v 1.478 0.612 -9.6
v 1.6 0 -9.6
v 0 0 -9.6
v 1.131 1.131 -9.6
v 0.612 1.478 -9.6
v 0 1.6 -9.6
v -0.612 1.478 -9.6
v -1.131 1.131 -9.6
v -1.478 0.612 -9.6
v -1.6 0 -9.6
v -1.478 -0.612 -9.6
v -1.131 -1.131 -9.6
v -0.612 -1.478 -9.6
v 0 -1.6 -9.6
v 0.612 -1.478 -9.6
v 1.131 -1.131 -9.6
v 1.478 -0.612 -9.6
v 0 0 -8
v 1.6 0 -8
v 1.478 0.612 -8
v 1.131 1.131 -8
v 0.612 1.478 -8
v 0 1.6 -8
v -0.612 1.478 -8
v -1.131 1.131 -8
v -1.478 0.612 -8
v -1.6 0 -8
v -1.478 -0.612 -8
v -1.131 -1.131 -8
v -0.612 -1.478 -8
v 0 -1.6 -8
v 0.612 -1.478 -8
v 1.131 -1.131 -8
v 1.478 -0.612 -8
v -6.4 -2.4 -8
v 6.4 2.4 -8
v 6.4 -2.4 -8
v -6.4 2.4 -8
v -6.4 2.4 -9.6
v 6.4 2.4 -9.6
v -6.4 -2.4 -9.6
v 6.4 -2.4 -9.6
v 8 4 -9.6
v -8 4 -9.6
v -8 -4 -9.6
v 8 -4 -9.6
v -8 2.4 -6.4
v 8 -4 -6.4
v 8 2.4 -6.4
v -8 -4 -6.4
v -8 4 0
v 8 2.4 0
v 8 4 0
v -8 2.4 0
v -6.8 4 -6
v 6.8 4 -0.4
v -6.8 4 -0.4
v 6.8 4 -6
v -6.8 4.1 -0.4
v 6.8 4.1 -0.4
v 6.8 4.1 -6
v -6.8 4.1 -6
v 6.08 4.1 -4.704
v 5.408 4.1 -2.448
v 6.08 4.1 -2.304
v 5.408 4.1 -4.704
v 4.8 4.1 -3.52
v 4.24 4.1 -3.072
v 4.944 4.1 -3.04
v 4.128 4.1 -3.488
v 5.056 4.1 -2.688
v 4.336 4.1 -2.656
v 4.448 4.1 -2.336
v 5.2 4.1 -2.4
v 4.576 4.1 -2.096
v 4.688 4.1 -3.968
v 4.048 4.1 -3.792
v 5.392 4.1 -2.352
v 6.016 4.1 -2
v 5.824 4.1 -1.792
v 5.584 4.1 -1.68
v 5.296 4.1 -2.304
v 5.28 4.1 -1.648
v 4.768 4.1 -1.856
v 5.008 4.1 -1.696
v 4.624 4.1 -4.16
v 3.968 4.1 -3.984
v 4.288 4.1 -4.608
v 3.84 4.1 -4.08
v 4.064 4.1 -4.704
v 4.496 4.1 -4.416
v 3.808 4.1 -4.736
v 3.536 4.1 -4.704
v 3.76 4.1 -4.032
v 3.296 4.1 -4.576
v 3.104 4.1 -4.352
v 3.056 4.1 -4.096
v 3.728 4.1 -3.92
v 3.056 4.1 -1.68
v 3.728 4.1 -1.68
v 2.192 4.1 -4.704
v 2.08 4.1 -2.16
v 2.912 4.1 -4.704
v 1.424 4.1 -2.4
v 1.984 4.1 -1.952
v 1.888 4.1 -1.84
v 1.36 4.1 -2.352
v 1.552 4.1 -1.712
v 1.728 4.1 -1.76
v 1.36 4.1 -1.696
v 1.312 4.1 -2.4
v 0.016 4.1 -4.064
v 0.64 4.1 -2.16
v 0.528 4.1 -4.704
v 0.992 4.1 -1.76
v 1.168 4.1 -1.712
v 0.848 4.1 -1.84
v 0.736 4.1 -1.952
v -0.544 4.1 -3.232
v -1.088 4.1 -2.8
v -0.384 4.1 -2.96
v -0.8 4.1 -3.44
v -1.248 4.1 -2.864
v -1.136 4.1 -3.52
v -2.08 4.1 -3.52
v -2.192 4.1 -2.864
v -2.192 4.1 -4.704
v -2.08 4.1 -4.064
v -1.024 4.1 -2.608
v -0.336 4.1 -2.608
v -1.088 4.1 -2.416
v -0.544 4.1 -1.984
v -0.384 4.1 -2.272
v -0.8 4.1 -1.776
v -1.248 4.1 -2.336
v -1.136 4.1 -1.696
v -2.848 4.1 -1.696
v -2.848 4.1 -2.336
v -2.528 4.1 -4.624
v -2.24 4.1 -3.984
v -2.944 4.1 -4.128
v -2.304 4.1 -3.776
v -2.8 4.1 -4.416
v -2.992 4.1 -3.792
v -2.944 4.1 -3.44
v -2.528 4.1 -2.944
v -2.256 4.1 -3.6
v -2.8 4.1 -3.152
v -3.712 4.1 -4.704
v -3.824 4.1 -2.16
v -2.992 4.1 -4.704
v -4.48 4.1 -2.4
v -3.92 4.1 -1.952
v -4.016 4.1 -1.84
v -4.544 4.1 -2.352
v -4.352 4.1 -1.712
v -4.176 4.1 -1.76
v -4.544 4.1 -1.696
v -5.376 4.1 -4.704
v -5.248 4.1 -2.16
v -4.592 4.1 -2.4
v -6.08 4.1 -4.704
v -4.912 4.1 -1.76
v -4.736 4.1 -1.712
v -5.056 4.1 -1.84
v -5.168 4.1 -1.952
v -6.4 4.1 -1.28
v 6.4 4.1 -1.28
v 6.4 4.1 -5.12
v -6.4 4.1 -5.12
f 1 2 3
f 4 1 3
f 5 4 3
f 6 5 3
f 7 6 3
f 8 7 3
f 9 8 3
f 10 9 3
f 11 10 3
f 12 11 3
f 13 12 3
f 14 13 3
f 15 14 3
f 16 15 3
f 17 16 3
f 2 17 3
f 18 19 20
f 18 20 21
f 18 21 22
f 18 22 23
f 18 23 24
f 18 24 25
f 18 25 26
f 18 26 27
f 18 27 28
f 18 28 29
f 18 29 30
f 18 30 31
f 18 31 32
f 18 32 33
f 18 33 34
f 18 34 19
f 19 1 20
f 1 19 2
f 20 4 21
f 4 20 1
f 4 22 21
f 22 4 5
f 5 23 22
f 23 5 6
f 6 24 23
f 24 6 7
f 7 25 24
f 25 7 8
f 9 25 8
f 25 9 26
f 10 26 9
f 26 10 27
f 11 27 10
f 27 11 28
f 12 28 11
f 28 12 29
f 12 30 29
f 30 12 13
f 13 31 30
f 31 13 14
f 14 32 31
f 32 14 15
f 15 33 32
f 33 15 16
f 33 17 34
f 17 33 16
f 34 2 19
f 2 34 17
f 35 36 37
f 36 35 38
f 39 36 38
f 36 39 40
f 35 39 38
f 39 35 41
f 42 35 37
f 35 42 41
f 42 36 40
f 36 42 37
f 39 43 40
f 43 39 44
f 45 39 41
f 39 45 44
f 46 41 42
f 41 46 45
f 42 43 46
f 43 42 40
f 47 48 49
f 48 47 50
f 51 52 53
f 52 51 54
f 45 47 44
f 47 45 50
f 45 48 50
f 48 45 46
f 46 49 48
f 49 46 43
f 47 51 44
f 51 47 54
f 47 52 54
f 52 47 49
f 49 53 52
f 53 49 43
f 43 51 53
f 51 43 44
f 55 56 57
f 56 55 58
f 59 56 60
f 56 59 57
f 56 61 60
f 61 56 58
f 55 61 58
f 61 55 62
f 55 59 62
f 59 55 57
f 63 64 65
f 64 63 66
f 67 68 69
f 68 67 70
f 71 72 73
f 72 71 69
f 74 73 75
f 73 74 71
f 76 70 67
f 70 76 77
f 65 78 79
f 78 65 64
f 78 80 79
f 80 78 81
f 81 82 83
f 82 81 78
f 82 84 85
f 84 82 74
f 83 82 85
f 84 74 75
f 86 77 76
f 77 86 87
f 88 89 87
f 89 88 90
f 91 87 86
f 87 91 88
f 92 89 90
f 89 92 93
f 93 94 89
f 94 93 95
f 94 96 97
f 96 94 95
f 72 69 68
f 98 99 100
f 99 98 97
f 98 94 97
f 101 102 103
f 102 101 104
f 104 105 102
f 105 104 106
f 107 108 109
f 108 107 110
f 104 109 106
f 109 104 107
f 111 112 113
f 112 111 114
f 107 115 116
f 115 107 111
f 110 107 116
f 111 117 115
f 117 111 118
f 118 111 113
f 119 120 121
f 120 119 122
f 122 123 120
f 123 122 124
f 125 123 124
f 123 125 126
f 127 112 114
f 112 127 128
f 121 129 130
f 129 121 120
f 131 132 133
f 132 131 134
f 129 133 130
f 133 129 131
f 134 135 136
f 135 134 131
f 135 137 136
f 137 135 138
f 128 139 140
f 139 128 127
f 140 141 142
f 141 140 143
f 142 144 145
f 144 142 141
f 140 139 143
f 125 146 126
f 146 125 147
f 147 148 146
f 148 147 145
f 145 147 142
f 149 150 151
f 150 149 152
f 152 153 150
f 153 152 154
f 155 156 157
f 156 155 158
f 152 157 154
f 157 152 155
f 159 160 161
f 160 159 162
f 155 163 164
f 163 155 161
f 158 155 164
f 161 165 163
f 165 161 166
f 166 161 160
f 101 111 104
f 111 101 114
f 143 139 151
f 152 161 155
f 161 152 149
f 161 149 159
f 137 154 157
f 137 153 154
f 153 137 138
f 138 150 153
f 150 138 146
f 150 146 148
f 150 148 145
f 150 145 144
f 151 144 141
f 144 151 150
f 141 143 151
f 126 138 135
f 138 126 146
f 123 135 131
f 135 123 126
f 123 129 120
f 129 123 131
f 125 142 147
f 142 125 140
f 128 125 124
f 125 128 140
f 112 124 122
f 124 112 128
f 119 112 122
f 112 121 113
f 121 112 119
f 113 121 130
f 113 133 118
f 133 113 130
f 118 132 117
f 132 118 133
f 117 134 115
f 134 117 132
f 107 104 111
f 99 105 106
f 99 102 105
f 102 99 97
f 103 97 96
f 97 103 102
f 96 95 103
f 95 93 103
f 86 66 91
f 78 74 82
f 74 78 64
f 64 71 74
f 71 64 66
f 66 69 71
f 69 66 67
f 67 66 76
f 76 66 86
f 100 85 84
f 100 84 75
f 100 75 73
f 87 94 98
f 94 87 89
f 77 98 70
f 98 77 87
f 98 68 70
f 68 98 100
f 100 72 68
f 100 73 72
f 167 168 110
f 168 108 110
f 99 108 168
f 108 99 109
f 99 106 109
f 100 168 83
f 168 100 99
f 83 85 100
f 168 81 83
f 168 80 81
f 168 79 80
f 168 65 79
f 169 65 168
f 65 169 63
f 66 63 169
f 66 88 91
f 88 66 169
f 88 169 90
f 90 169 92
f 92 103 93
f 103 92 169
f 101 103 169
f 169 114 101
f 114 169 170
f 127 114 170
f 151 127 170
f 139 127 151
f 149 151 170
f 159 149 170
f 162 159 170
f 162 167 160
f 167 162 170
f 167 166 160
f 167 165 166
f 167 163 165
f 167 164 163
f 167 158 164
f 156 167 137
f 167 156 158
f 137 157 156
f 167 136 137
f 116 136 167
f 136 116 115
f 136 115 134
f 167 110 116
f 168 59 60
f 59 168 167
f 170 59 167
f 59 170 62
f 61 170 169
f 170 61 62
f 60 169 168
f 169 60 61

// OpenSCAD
// file: ../p/4-4edge.scad
use <../lib.scad>
function ldraw_lib__4_4edge() = [
// 0 Circle 1.0
// 0 Name: 4-4edge.dat
// 0 Author: James Jessiman
// 0 !LDRAW_ORG Primitive UPDATE 2017-01
// 0 !LICENSE Licensed under CC BY 2.0 and CC BY 4.0 : see CAreadme.txt
// 
// 0 BFC CERTIFY CCW
  [0,"BFC","CERTIFY"],
  [0,"BFC","CCW"],
// 
// 0 !HISTORY 1998-12-15 [PTadmin] Official Update 1998-10
// 0 !HISTORY 2005-12-28 [PTadmin] Official Update 2005-01
// 0 !HISTORY 2007-06-24 [PTadmin] Header formatted for Contributor Agreement
// 0 !HISTORY 2008-07-01 [PTadmin] Official Update 2008-01
// 0 !HISTORY 2017-01-15 [Steffen] BFCed
// 0 !HISTORY 2017-12-30 [PTadmin] Official Update 2017-01
// 
// 
// 2 24 1 0 0 0.9239 0 0.3827
  [2,24,1,0,0,0.9239,0,0.3827],
// 2 24 0.9239 0 0.3827 0.7071 0 0.7071
  [2,24,0.9239,0,0.3827,0.7071,0,0.7071],
// 2 24 0.7071 0 0.7071 0.3827 0 0.9239
  [2,24,0.7071,0,0.7071,0.3827,0,0.9239],
// 2 24 0.3827 0 0.9239 0 0 1
  [2,24,0.3827,0,0.9239,0,0,1],
// 2 24 0 0 1 -0.3827 0 0.9239
  [2,24,0,0,1,-0.3827,0,0.9239],
// 2 24 -0.3827 0 0.9239 -0.7071 0 0.7071
  [2,24,-0.3827,0,0.9239,-0.7071,0,0.7071],
// 2 24 -0.7071 0 0.7071 -0.9239 0 0.3827
  [2,24,-0.7071,0,0.7071,-0.9239,0,0.3827],
// 2 24 -0.9239 0 0.3827 -1 0 -0
  [2,24,-0.9239,0,0.3827,-1,0,-0],
// 2 24 -1 0 -0 -0.9239 0 -0.3827
  [2,24,-1,0,-0,-0.9239,0,-0.3827],
// 2 24 -0.9239 0 -0.3827 -0.7071 0 -0.7071
  [2,24,-0.9239,0,-0.3827,-0.7071,0,-0.7071],
// 2 24 -0.7071 0 -0.7071 -0.3827 0 -0.9239
  [2,24,-0.7071,0,-0.7071,-0.3827,0,-0.9239],
// 2 24 -0.3827 0 -0.9239 0 0 -1
  [2,24,-0.3827,0,-0.9239,0,0,-1],
// 2 24 0 0 -1 0.3827 0 -0.9239
  [2,24,0,0,-1,0.3827,0,-0.9239],
// 2 24 0.3827 0 -0.9239 0.7071 0 -0.7071
  [2,24,0.3827,0,-0.9239,0.7071,0,-0.7071],
// 2 24 0.7071 0 -0.7071 0.9239 0 -0.3827
  [2,24,0.7071,0,-0.7071,0.9239,0,-0.3827],
// 2 24 0.9239 0 -0.3827 1 0 0
  [2,24,0.9239,0,-0.3827,1,0,0],
];
module ldraw_lib__4_4edge(step=0, col=false, unit=2/5, alt=false, line=0.2, solid=!$preview)
    makepoly(ldraw_lib__4_4edge(), step=step, col=col, unit=unit, alt=alt, line=line, solid=solid);
ldraw_lib__4_4edge(line=0.2);
// file: ../p/4-4disc.scad
use <../lib.scad>
function ldraw_lib__4_4disc() = [
// 0 Disc 1.0
// 0 Name: 4-4disc.dat
// 0 Author: James Jessiman
// 0 !LDRAW_ORG Primitive UPDATE 2002-02
// 0 !LICENSE Licensed under CC BY 2.0 and CC BY 4.0 : see CAreadme.txt
// 
// 0 BFC CERTIFY CCW
  [0,"BFC","CERTIFY"],
  [0,"BFC","CCW"],
// 
// 0 !HISTORY 1998-12-15 [PTadmin] Official Update 1998-10
// 0 !HISTORY 2002-03-23 [sbliss] Added BFC statement
// 0 !HISTORY 2002-04-25 [PTadmin] Official Update 2002-02
// 0 !HISTORY 2007-06-24 [PTadmin] Header formatted for Contributor Agreement
// 0 !HISTORY 2008-07-01 [PTadmin] Official Update 2008-01
// 
// 
// 3 16 0 0 0 1 0 0 0.9239 0 0.3827
  [3,16,0,0,0,1,0,0,0.9239,0,0.3827],
// 3 16 0 0 0 0.9239 0 0.3827 0.7071 0 0.7071
  [3,16,0,0,0,0.9239,0,0.3827,0.7071,0,0.7071],
// 3 16 0 0 0 0.7071 0 0.7071 0.3827 0 0.9239
  [3,16,0,0,0,0.7071,0,0.7071,0.3827,0,0.9239],
// 3 16 0 0 0 0.3827 0 0.9239 0 0 1
  [3,16,0,0,0,0.3827,0,0.9239,0,0,1],
// 3 16 0 0 0 0 0 1 -0.3827 0 0.9239
  [3,16,0,0,0,0,0,1,-0.3827,0,0.9239],
// 3 16 0 0 0 -0.3827 0 0.9239 -0.7071 0 0.7071
  [3,16,0,0,0,-0.3827,0,0.9239,-0.7071,0,0.7071],
// 3 16 0 0 0 -0.7071 0 0.7071 -0.9239 0 0.3827
  [3,16,0,0,0,-0.7071,0,0.7071,-0.9239,0,0.3827],
// 3 16 0 0 0 -0.9239 0 0.3827 -1 0 -0
  [3,16,0,0,0,-0.9239,0,0.3827,-1,0,-0],
// 3 16 0 0 0 -1 0 -0 -0.9239 0 -0.3827
  [3,16,0,0,0,-1,0,-0,-0.9239,0,-0.3827],
// 3 16 0 0 0 -0.9239 0 -0.3827 -0.7071 0 -0.7071
  [3,16,0,0,0,-0.9239,0,-0.3827,-0.7071,0,-0.7071],
// 3 16 0 0 0 -0.7071 0 -0.7071 -0.3827 0 -0.9239
  [3,16,0,0,0,-0.7071,0,-0.7071,-0.3827,0,-0.9239],
// 3 16 0 0 0 -0.3827 0 -0.9239 0 0 -1
  [3,16,0,0,0,-0.3827,0,-0.9239,0,0,-1],
// 3 16 0 0 0 0 0 -1 0.3827 0 -0.9239
  [3,16,0,0,0,0,0,-1,0.3827,0,-0.9239],
// 3 16 0 0 0 0.3827 0 -0.9239 0.7071 0 -0.7071
  [3,16,0,0,0,0.3827,0,-0.9239,0.7071,0,-0.7071],
// 3 16 0 0 0 0.7071 0 -0.7071 0.9239 0 -0.3827
  [3,16,0,0,0,0.7071,0,-0.7071,0.9239,0,-0.3827],
// 3 16 0 0 0 0.9239 0 -0.3827 1 0 0
  [3,16,0,0,0,0.9239,0,-0.3827,1,0,0],
// 0
];
module ldraw_lib__4_4disc(step=0, col=false, unit=2/5, alt=false, line=0.2, solid=!$preview)
    makepoly(ldraw_lib__4_4disc(), step=step, col=col, unit=unit, alt=alt, line=line, solid=solid);
ldraw_lib__4_4disc(line=0.2);
// file: ../p/4-4cyli.scad
use <../lib.scad>
$fa=1; $fs=0.2;
function ldraw_lib__4_4cyli(realsolid=false) = [
// 0 Cylinder 1.0
// 0 Name: 4-4cyli.dat
// 0 Author: James Jessiman
// 0 !LDRAW_ORG Primitive UPDATE 2005-01
// 0 !LICENSE Licensed under CC BY 2.0 and CC BY 4.0 : see CAreadme.txt
// 
// 0 BFC CERTIFY CCW
  [0,"BFC","CERTIFY"],
  [0,"BFC","CCW"],
// 
// 0 !HISTORY 1998-12-15 [PTadmin] Official Update 1998-10
// 0 !HISTORY 2002-03-23 [sbliss] Added BFC statement; merged headers from files in distributions LDraw 0.27 and Complete.
// 0 !HISTORY 2002-04-25 [PTadmin] Official Update 2002-02
// 0 !HISTORY 2004-12-14 [guyvivan] BFC CCW
// 0 !HISTORY 2005-12-28 [PTadmin] Official Update 2005-01
// 0 !HISTORY 2007-06-24 [PTadmin] Header formatted for Contributor Agreement
// 0 !HISTORY 2008-07-01 [PTadmin] Official Update 2008-01
// 
// 
// 4 16 1 1 0 0.9239 1 0.3827 0.9239 0 0.3827 1 0 0
  [4,16,1,1,0,0.9239,1,0.3827,0.9239,0,0.3827,1,0,0],
// 5 24 1 0 0 1 1 0 0.9239 0 0.3827 0.9239 0 -0.3827
  [5,24,1,0,0,1,1,0,0.9239,0,0.3827,0.9239,0,-0.3827],
// 4 16 0.9239 1 0.3827 0.7071 1 0.7071 0.7071 0 0.7071 0.9239 0 0.3827
  [4,16,0.9239,1,0.3827,0.7071,1,0.7071,0.7071,0,0.7071,0.9239,0,0.3827],
// 5 24 0.9239 0 0.3827 0.9239 1 0.3827 0.7071 0 0.7071 1 0 0
  [5,24,0.9239,0,0.3827,0.9239,1,0.3827,0.7071,0,0.7071,1,0,0],
// 4 16 0.7071 1 0.7071 0.3827 1 0.9239 0.3827 0 0.9239 0.7071 0 0.7071
  [4,16,0.7071,1,0.7071,0.3827,1,0.9239,0.3827,0,0.9239,0.7071,0,0.7071],
// 5 24 0.7071 0 0.7071 0.7071 1 0.7071 0.3827 0 0.9239 0.9239 0 0.3827
  [5,24,0.7071,0,0.7071,0.7071,1,0.7071,0.3827,0,0.9239,0.9239,0,0.3827],
// 4 16 0.3827 1 0.9239 0 1 1 0 0 1 0.3827 0 0.9239
  [4,16,0.3827,1,0.9239,0,1,1,0,0,1,0.3827,0,0.9239],
// 5 24 0.3827 0 0.9239 0.3827 1 0.9239 0 0 1 0.7071 0 0.7071
  [5,24,0.3827,0,0.9239,0.3827,1,0.9239,0,0,1,0.7071,0,0.7071],
// 4 16 0 1 1 -0.3827 1 0.9239 -0.3827 0 0.9239 0 0 1
  [4,16,0,1,1,-0.3827,1,0.9239,-0.3827,0,0.9239,0,0,1],
// 5 24 0 0 1 0 1 1 -0.3827 0 0.9239 0.3827 0 0.9239
  [5,24,0,0,1,0,1,1,-0.3827,0,0.9239,0.3827,0,0.9239],
// 4 16 -0.3827 1 0.9239 -0.7071 1 0.7071 -0.7071 0 0.7071 -0.3827 0 0.9239
  [4,16,-0.3827,1,0.9239,-0.7071,1,0.7071,-0.7071,0,0.7071,-0.3827,0,0.9239],
// 5 24 -0.3827 0 0.9239 -0.3827 1 0.9239 -0.7071 0 0.7071 0 0 1
  [5,24,-0.3827,0,0.9239,-0.3827,1,0.9239,-0.7071,0,0.7071,0,0,1],
// 4 16 -0.7071 1 0.7071 -0.9239 1 0.3827 -0.9239 0 0.3827 -0.7071 0 0.7071
  [4,16,-0.7071,1,0.7071,-0.9239,1,0.3827,-0.9239,0,0.3827,-0.7071,0,0.7071],
// 5 24 -0.7071 0 0.7071 -0.7071 1 0.7071 -0.9239 0 0.3827 -0.3827 0 0.9239
  [5,24,-0.7071,0,0.7071,-0.7071,1,0.7071,-0.9239,0,0.3827,-0.3827,0,0.9239],
// 4 16 -0.9239 1 0.3827 -1 1 0 -1 0 0 -0.9239 0 0.3827
  [4,16,-0.9239,1,0.3827,-1,1,0,-1,0,0,-0.9239,0,0.3827],
// 5 24 -0.9239 0 0.3827 -0.9239 1 0.3827 -1 0 0 -0.7071 0 0.7071
  [5,24,-0.9239,0,0.3827,-0.9239,1,0.3827,-1,0,0,-0.7071,0,0.7071],
// 4 16 -1 1 0 -0.9239 1 -0.3827 -0.9239 0 -0.3827 -1 0 0
  [4,16,-1,1,0,-0.9239,1,-0.3827,-0.9239,0,-0.3827,-1,0,0],
// 5 24 -1 0 0 -1 1 0 -0.9239 0 -0.3827 -0.9239 0 0.3827
  [5,24,-1,0,0,-1,1,0,-0.9239,0,-0.3827,-0.9239,0,0.3827],
// 4 16 -0.9239 1 -0.3827 -0.7071 1 -0.7071 -0.7071 0 -0.7071 -0.9239 0 -0.3827
  [4,16,-0.9239,1,-0.3827,-0.7071,1,-0.7071,-0.7071,0,-0.7071,-0.9239,0,-0.3827],
// 5 24 -0.9239 0 -0.3827 -0.9239 1 -0.3827 -0.7071 0 -0.7071 -1 0 0
  [5,24,-0.9239,0,-0.3827,-0.9239,1,-0.3827,-0.7071,0,-0.7071,-1,0,0],
// 4 16 -0.7071 1 -0.7071 -0.3827 1 -0.9239 -0.3827 0 -0.9239 -0.7071 0 -0.7071
  [4,16,-0.7071,1,-0.7071,-0.3827,1,-0.9239,-0.3827,0,-0.9239,-0.7071,0,-0.7071],
// 5 24 -0.7071 0 -0.7071 -0.7071 1 -0.7071 -0.3827 0 -0.9239 -0.9239 0 -0.3827
  [5,24,-0.7071,0,-0.7071,-0.7071,1,-0.7071,-0.3827,0,-0.9239,-0.9239,0,-0.3827],
// 4 16 -0.3827 1 -0.9239 0 1 -1 0 0 -1 -0.3827 0 -0.9239
  [4,16,-0.3827,1,-0.9239,0,1,-1,0,0,-1,-0.3827,0,-0.9239],
// 5 24 -0.3827 0 -0.9239 -0.3827 1 -0.9239 0 0 -1 -0.7071 0 -0.7071
  [5,24,-0.3827,0,-0.9239,-0.3827,1,-0.9239,0,0,-1,-0.7071,0,-0.7071],
// 4 16 0 1 -1 0.3827 1 -0.9239 0.3827 0 -0.9239 0 0 -1
  [4,16,0,1,-1,0.3827,1,-0.9239,0.3827,0,-0.9239,0,0,-1],
// 5 24 0 0 -1 0 1 -1 0.3827 0 -0.9239 -0.3827 0 -0.9239
  [5,24,0,0,-1,0,1,-1,0.3827,0,-0.9239,-0.3827,0,-0.9239],
// 4 16 0.3827 1 -0.9239 0.7071 1 -0.7071 0.7071 0 -0.7071 0.3827 0 -0.9239
  [4,16,0.3827,1,-0.9239,0.7071,1,-0.7071,0.7071,0,-0.7071,0.3827,0,-0.9239],
// 5 24 0.3827 0 -0.9239 0.3827 1 -0.9239 0.7071 0 -0.7071 0 0 -1
  [5,24,0.3827,0,-0.9239,0.3827,1,-0.9239,0.7071,0,-0.7071,0,0,-1],
// 4 16 0.7071 1 -0.7071 0.9239 1 -0.3827 0.9239 0 -0.3827 0.7071 0 -0.7071
  [4,16,0.7071,1,-0.7071,0.9239,1,-0.3827,0.9239,0,-0.3827,0.7071,0,-0.7071],
// 5 24 0.7071 0 -0.7071 0.7071 1 -0.7071 0.9239 0 -0.3827 0.3827 0 -0.9239
  [5,24,0.7071,0,-0.7071,0.7071,1,-0.7071,0.9239,0,-0.3827,0.3827,0,-0.9239],
// 4 16 0.9239 1 -0.3827 1 1 0 1 0 0 0.9239 0 -0.3827
  [4,16,0.9239,1,-0.3827,1,1,0,1,0,0,0.9239,0,-0.3827],
// 5 24 0.9239 0 -0.3827 0.9239 1 -0.3827 1 0 0 0.7071 0 -0.7071
  [5,24,0.9239,0,-0.3827,0.9239,1,-0.3827,1,0,0,0.7071,0,-0.7071],
// 0
];
module ldraw_lib__4_4cyli(step=0, col=false, unit=2/5, alt=false, line=0.2, solid=!$preview)
    makepoly(ldraw_lib__4_4cyli(solid), step=step, col=col, unit=unit, alt=alt, line=line, solid=solid);
ldraw_lib__4_4cyli(line=0.2);
// file: ../p/stud3.scad
use <../lib.scad>
use <4-4cyli.scad>
use <4-4disc.scad>
use <4-4edge.scad>
function ldraw_lib__stud3() = [
// 0 Stud Tube Solid
// 0 Name: stud3.dat
// 0 Author: James Jessiman
// 0 !LDRAW_ORG Primitive UPDATE 2012-01
// 0 !LICENSE Licensed under CC BY 4.0 : see CAreadme.txt
// 
// 0 BFC CERTIFY CCW
  [0,"BFC","CERTIFY"],
  [0,"BFC","CCW"],
// 
// 0 !HISTORY 2002-04-04 [sbliss] Modified for BFC compliance
// 0 !HISTORY 2002-04-25 [PTadmin] Official Update 2002-02
// 0 !HISTORY 2007-06-24 [PTadmin] Header formatted for Contributor Agreement
// 0 !HISTORY 2008-07-01 [PTadmin] Official Update 2008-01
// 0 !HISTORY 2012-02-16 [Philo] Changed to CCW
// 0 !HISTORY 2012-03-30 [PTadmin] Official Update 2012-01
// 
// 
// 1 16 0 -4 0 4 0 0 0 1 0 0 0 4 4-4edge.dat
  [1,16,0,-4,0,4,0,0,0,1,0,0,0,4, ldraw_lib__4_4edge()],
// 1 16 0 0 0 4 0 0 0 1 0 0 0 4 4-4edge.dat
  [1,16,0,0,0,4,0,0,0,1,0,0,0,4, ldraw_lib__4_4edge()],
// 1 16 0 -4 0 4 0 0 0 1 0 0 0 4 4-4disc.dat
  [1,16,0,-4,0,4,0,0,0,1,0,0,0,4, ldraw_lib__4_4disc()],
  [-1,16,0,0,0,4,0,0,0,-1,0,0,0,4, ldraw_lib__4_4disc()],
// 1 16 0 -4 0 4 0 0 0 4 0 0 0 4 4-4cyli.dat
  [1,16,0,-4,0,4,0,0,0,4,0,0,0,4, ldraw_lib__4_4cyli()],
];
module ldraw_lib__stud3(step=0, col=false, unit=2/5, alt=false, line=0.2, solid=!$preview)
    makepoly(ldraw_lib__stud3(), step=step, col=col, unit=unit, alt=alt, line=line, solid=solid);
ldraw_lib__stud3(line=0.2);
// file: ../p/box5.scad
use <../lib.scad>
function ldraw_lib__box5() = [
// 0 Box with 5 Faces and All Edges
// 0 Name: box5.dat
// 0 Author: James Jessiman
// 0 !LDRAW_ORG Primitive UPDATE 2012-01
// 0 !LICENSE Licensed under CC BY 2.0 and CC BY 4.0 : see CAreadme.txt
// 
// 0 BFC CERTIFY CCW
  [0,"BFC","CERTIFY"],
  [0,"BFC","CCW"],
// 
// 0 !HISTORY 2002-04-03 [sbliss] Modified for BFC compliance
// 0 !HISTORY 2002-04-25 [PTadmin] Official Update 2002-02
// 0 !HISTORY 2007-06-24 [PTadmin] Header formatted for Contributor Agreement
// 0 !HISTORY 2008-07-01 [PTadmin] Official Update 2008-01
// 0 !HISTORY 2012-02-16 [Philo] Changed to CCW
// 0 !HISTORY 2012-03-30 [PTadmin] Official Update 2012-01
// 
// 
// 2 24 1 1 1 -1 1 1
  [2,24,1,1,1,-1,1,1],
// 2 24 -1 1 1 -1 1 -1
  [2,24,-1,1,1,-1,1,-1],
// 2 24 -1 1 -1 1 1 -1
  [2,24,-1,1,-1,1,1,-1],
// 2 24 1 1 -1 1 1 1
  [2,24,1,1,-1,1,1,1],
// 2 24 1 0 1 -1 0 1
  [2,24,1,0,1,-1,0,1],
// 2 24 -1 0 1 -1 0 -1
  [2,24,-1,0,1,-1,0,-1],
// 2 24 -1 0 -1 1 0 -1
  [2,24,-1,0,-1,1,0,-1],
// 2 24 1 0 -1 1 0 1
  [2,24,1,0,-1,1,0,1],
// 2 24 1 0 1 1 1 1
  [2,24,1,0,1,1,1,1],
// 2 24 -1 0 1 -1 1 1
  [2,24,-1,0,1,-1,1,1],
// 2 24 1 0 -1 1 1 -1
  [2,24,1,0,-1,1,1,-1],
// 2 24 -1 0 -1 -1 1 -1
  [2,24,-1,0,-1,-1,1,-1],
// 4 16 -1 1 1 1 1 1 1 1 -1 -1 1 -1
  [4,16,-1,1,1,1,1,1,1,1,-1,-1,1,-1],
// 4 16 -1 1 1 -1 0 1 1 0 1 1 1 1
  [4,16,-1,1,1,-1,0,1,1,0,1,1,1,1],
// 4 16 -1 1 -1 -1 0 -1 -1 0 1 -1 1 1
  [4,16,-1,1,-1,-1,0,-1,-1,0,1,-1,1,1],
// 4 16 1 1 -1 1 0 -1 -1 0 -1 -1 1 -1
  [4,16,1,1,-1,1,0,-1,-1,0,-1,-1,1,-1],
// 4 16 1 1 1 1 0 1 1 0 -1 1 1 -1
  [4,16,1,1,1,1,0,1,1,0,-1,1,1,-1],
];
makepoly(ldraw_lib__box5(), line=0.2);
// file: s/4865as01.scad
use <../../lib.scad>
use <../../p/box5.scad>
use <../../p/stud3.scad>
function ldraw_lib__s__4865as01() = [
// 0 ~Panel  1 x  2 x  1 without Front Face
// 0 Name: s\4865as01.dat
// 0 Author: James Jessiman
// 0 !LDRAW_ORG Subpart UPDATE 2020-03
// 0 !LICENSE Licensed under CC BY 2.0 and CC BY 4.0 : see CAreadme.txt
// 
// 0 BFC CERTIFY CCW
  [0,"BFC","CERTIFY"],
  [0,"BFC","CCW"],
// 
// 0 !HISTORY 2003-07-03 [Steffen] BFCed, subfiled
// 0 !HISTORY 2004-04-22 [PTadmin] Official Update 2004-02
// 0 !HISTORY 2007-09-10 [PTadmin] Header formatted for Contributor Agreement
// 0 !HISTORY 2008-07-01 [PTadmin] Official Update 2008-01
// 0 !HISTORY 2020-07-14 [PTadmin] Renamed from s/4865s01
// 0 !HISTORY 2020-12-29 [PTadmin] Official Update 2020-03
// 
// 
// 1 16 0 20 0 1 0 0 0 -1 0 0 0 1 stud3.dat
  [1,16,0,20,0,1,0,0,0,-1,0,0,0,1, ldraw_lib__stud3()],
// 0 BFC INVERTNEXT
  [0,"BFC","INVERTNEXT"],
// 1 16 0 24 0 16 0 0 0 -4 0 0 0 6 box5.dat
  [1,16,0,24,0,16,0,0,0,-4,0,0,0,6, ldraw_lib__box5()],
// 4 16 20 24 10 16 24 6 -16 24 6 -20 24 10
  [4,16,20,24,10,16,24,6,-16,24,6,-20,24,10],
// 4 16 -20 24 10 -16 24 6 -16 24 -6 -20 24 -10
  [4,16,-20,24,10,-16,24,6,-16,24,-6,-20,24,-10],
// 4 16 -20 24 -10 -16 24 -6 16 24 -6 20 24 -10
  [4,16,-20,24,-10,-16,24,-6,16,24,-6,20,24,-10],
// 4 16 20 24 -10 16 24 -6 16 24 6 20 24 10
  [4,16,20,24,-10,16,24,-6,16,24,6,20,24,10],
// 2 24 20 24 10 -20 24 10
  [2,24,20,24,10,-20,24,10],
// 2 24 -20 24 10 -20 24 -10
  [2,24,-20,24,10,-20,24,-10],
// 2 24 -20 24 -10 20 24 -10
  [2,24,-20,24,-10,20,24,-10],
// 2 24 20 24 -10 20 24 10
  [2,24,20,24,-10,20,24,10],
// 2 24 20 16 6 -20 16 6
  [2,24,20,16,6,-20,16,6],
// 2 24 -20 16 6 -20 16 -10
  [2,24,-20,16,6,-20,16,-10],
// 2 24 -20 16 -10 20 16 -10
  [2,24,-20,16,-10,20,16,-10],
// 2 24 20 16 -10 20 16 6
  [2,24,20,16,-10,20,16,6],
// 2 24 20 0 10 -20 0 10
  [2,24,20,0,10,-20,0,10],
// 2 24 -20 0 10 -20 0 6
  [2,24,-20,0,10,-20,0,6],
// 2 24 -20 0 6 20 0 6
  [2,24,-20,0,6,20,0,6],
// 2 24 20 0 6 20 0 10
  [2,24,20,0,6,20,0,10],
// 2 24 20 0 6 20 16 6
  [2,24,20,0,6,20,16,6],
// 2 24 -20 0 6 -20 16 6
  [2,24,-20,0,6,-20,16,6],
// 2 24 20 16 -10 20 24 -10
  [2,24,20,16,-10,20,24,-10],
// 2 24 -20 16 -10 -20 24 -10
  [2,24,-20,16,-10,-20,24,-10],
// 2 24 20 0 10 20 24 10
  [2,24,20,0,10,20,24,10],
// 2 24 -20 0 10 -20 24 10
  [2,24,-20,0,10,-20,24,10],
// 4 16 20 16 -10 20 16 6 -20 16 6 -20 16 -10
  [4,16,20,16,-10,20,16,6,-20,16,6,-20,16,-10],
// 4 16 20 0 6 20 0 10 -20 0 10 -20 0 6
  [4,16,20,0,6,20,0,10,-20,0,10,-20,0,6],
// 4 16 -20 24 10 -20 24 -10 -20 16 -10 -20 16 6
  [4,16,-20,24,10,-20,24,-10,-20,16,-10,-20,16,6],
// 4 16 -20 24 -10 20 24 -10 20 16 -10 -20 16 -10
  [4,16,-20,24,-10,20,24,-10,20,16,-10,-20,16,-10],
// 4 16 20 24 -10 20 24 10 20 16 6 20 16 -10
  [4,16,20,24,-10,20,24,10,20,16,6,20,16,-10],
// 4 16 -20 24 10 -20 16 6 -20 0 6 -20 0 10
  [4,16,-20,24,10,-20,16,6,-20,0,6,-20,0,10],
// 4 16 -20 16 6 20 16 6 20 0 6 -20 0 6
  [4,16,-20,16,6,20,16,6,20,0,6,-20,0,6],
// 4 16 20 16 6 20 24 10 20 0 10 20 0 6
  [4,16,20,16,6,20,24,10,20,0,10,20,0,6],
// 0
];
makepoly(ldraw_lib__s__4865as01(), line=0.2);
// file: ../p/logo-nasa.scad
use <../lib.scad>
function ldraw_lib__logo_nasa() = [
// 0 Logo NASA Worm Logo
// 0 Name: logo-nasa.dat
// 0 Author: Takeshi Takahashi [RainbowDolphin]
// 0 !LDRAW_ORG Primitive UPDATE 2022-06
// 0 !LICENSE Licensed under CC BY 2.0 and CC BY 4.0 : see CAreadme.txt
// 
// 0 BFC CERTIFY CCW
  [0,"BFC","CERTIFY"],
  [0,"BFC","CCW"],
// 
// 0 !HISTORY 2022-04-22 [RainbowDolphin] Pattern extracted and resized from 10202p02 by Orion Pobursky [OrionP]
// 0 !HISTORY 2022-12-20 [PTadmin] Official Update 2022-06
// 
// 
// 4 16 -38 0 -9.4 -33.8 0 -9.4 -33.8 0 4.7 -38 0 5.6
  [4,16,-38,0,-9.4,-33.8,0,-9.4,-33.8,0,4.7,-38,0,5.6],
// 4 16 -26.5 0 .8 -30.9 0 1 -30 0 -2 -25.8 0 -1.8
  [4,16,-26.5,0,.8,-30.9,0,1,-30,0,-2,-25.8,0,-1.8],
// 4 16 -31.6 0 3.2 -30.9 0 1 -27.1 0 3.4 -27.8 0 5.4
  [4,16,-31.6,0,3.2,-30.9,0,1,-27.1,0,3.4,-27.8,0,5.4],
// 4 16 -32.5 0 5 -31.6 0 3.2 -27.8 0 5.4 -28.6 0 6.9
  [4,16,-32.5,0,5,-31.6,0,3.2,-27.8,0,5.4,-28.6,0,6.9],
// 4 16 -25.8 0 -1.8 -30 0 -2 -29.3 0 -4.8 -25.3 0 -3.7
  [4,16,-25.8,0,-1.8,-30,0,-2,-29.3,0,-4.8,-25.3,0,-3.7],
// 4 16 -33.7 0 5.3 -37.6 0 7.5 -38 0 5.6 -33.8 0 4.7
  [4,16,-33.7,0,5.3,-37.6,0,7.5,-38,0,5.6,-33.8,0,4.7],
// 4 16 -36.4 0 8.8 -37.6 0 7.5 -33.7 0 5.3 -34.9 0 9.5
  [4,16,-36.4,0,8.8,-37.6,0,7.5,-33.7,0,5.3,-34.9,0,9.5],
// 4 16 -34.9 0 9.5 -33.7 0 5.3 -33.1 0 5.6 -33 0 9.7
  [4,16,-34.9,0,9.5,-33.7,0,5.3,-33.1,0,5.6,-33,0,9.7],
// 4 16 -33.1 0 5.6 -32.5 0 5 -29.8 0 8.4 -31.3 0 9.4
  [4,16,-33.1,0,5.6,-32.5,0,5,-29.8,0,8.4,-31.3,0,9.4],
// 3 16 -33 0 9.7 -33.1 0 5.6 -31.3 0 9.4
  [3,16,-33,0,9.7,-33.1,0,5.6,-31.3,0,9.4],
// 3 16 -29.8 0 8.4 -32.5 0 5 -28.6 0 6.9
  [3,16,-29.8,0,8.4,-32.5,0,5,-28.6,0,6.9],
// 4 16 -25.3 0 -3.7 -29.3 0 -4.8 -28.9 0 -6 -24.8 0 -4.9
  [4,16,-25.3,0,-3.7,-29.3,0,-4.8,-28.9,0,-6,-24.8,0,-4.9],
// 4 16 -26.8 0 -8.8 -25.4 0 -9.4 -24 0 -5.5 -24.8 0 -4.9
  [4,16,-26.8,0,-8.8,-25.4,0,-9.4,-24,0,-5.5,-24.8,0,-4.9],
// 4 16 -28.1 0 -7.6 -26.8 0 -8.8 -24.8 0 -4.9 -28.9 0 -6
  [4,16,-28.1,0,-7.6,-26.8,0,-8.8,-24.8,0,-4.9,-28.9,0,-6],
// 4 16 -24 0 -5.5 -25.4 0 -9.4 -23.8 0 -9.6 -22.1 0 -9.4
  [4,16,-24,0,-5.5,-25.4,0,-9.4,-23.8,0,-9.6,-22.1,0,-9.4],
// 4 16 -23.5 0 -5.2 -24 0 -5.5 -22.1 0 -9.4 -20.6 0 -8.6
  [4,16,-23.5,0,-5.2,-24,0,-5.5,-22.1,0,-9.4,-20.6,0,-8.6],
// 4 16 -23.5 0 -5.2 -20.6 0 -8.6 -19.4 0 -7.2 -19.1 0 -5.6
  [4,16,-23.5,0,-5.2,-20.6,0,-8.6,-19.4,0,-7.2,-19.1,0,-5.6],
// 3 16 -27.1 0 3.4 -30.9 0 1 -26.5 0 .8
  [3,16,-27.1,0,3.4,-30.9,0,1,-26.5,0,.8],
// 4 16 -19.1 0 9.5 -23.3 0 9.5 -23.3 0 -4.5 -19.1 0 -5.6
  [4,16,-19.1,0,9.5,-23.3,0,9.5,-23.3,0,-4.5,-19.1,0,-5.6],
// 3 16 -23.3 0 -4.5 -23.5 0 -5.2 -19.1 0 -5.6
  [3,16,-23.3,0,-4.5,-23.5,0,-5.2,-19.1,0,-5.6],
// 4 16 -13 0 6.5 -18.2 0 -9.4 -13.7 0 -9.4 -8.9 0 5
  [4,16,-13,0,6.5,-18.2,0,-9.4,-13.7,0,-9.4,-8.9,0,5],
// 4 16 -8.9 0 5 -11.8 0 8.5 -12.4 0 7.8 -13 0 6.5
  [4,16,-8.9,0,5,-11.8,0,8.5,-12.4,0,7.8,-13,0,6.5],
// 4 16 -9.7 0 9.3 -10.8 0 9 -8.5 0 5.3 -8.5 0 9.4
  [4,16,-9.7,0,9.3,-10.8,0,9,-8.5,0,5.3,-8.5,0,9.4],
// 4 16 -10.8 0 9 -11.8 0 8.5 -8.9 0 5 -8.5 0 5.3
  [4,16,-10.8,0,9,-11.8,0,8.5,-8.9,0,5,-8.5,0,5.3],
// 4 16 -3.3 0 -9.4 -.1 0 -5.4 -4 0 6.5 -8.2 0 5
  [4,16,-3.3,0,-9.4,-.1,0,-5.4,-4,0,6.5,-8.2,0,5],
// 4 16 -6.2 0 9 -7.3 0 9.3 -8.5 0 5.3 -8.2 0 5
  [4,16,-6.2,0,9,-7.3,0,9.3,-8.5,0,5.3,-8.2,0,5],
// 3 16 -8.5 0 9.4 -8.5 0 5.3 -7.3 0 9.3
  [3,16,-8.5,0,9.4,-8.5,0,5.3,-7.3,0,9.3],
// 4 16 -8.2 0 5 -4.6 0 7.8 -5.3 0 8.5 -6.2 0 9
  [4,16,-8.2,0,5,-4.6,0,7.8,-5.3,0,8.5,-6.2,0,9],
// 3 16 -4.6 0 7.8 -8.2 0 5 -4 0 6.5
  [3,16,-4.6,0,7.8,-8.2,0,5,-4,0,6.5],
// 4 16 6.8 0 2.5 2.4 0 1.5 3.4 0 -.2 5 0 -1.5
  [4,16,6.8,0,2.5,2.4,0,1.5,3.4,0,-.2,5,0,-1.5],
// 4 16 5 0 -1.5 7.1 0 -2 7.8 0 2.1 6.8 0 2.5
  [4,16,5,0,-1.5,7.1,0,-2,7.8,0,2.1,6.8,0,2.5],
// 4 16 7.8 0 2.1 7.1 0 -2 13 0 -2 13.7 0 2.1
  [4,16,7.8,0,2.1,7.1,0,-2,13,0,-2,13.7,0,2.1],
// 4 16 13 0 -5.4 -.1 0 -5.4 -3.3 0 -9.4 13.7 0 -9.4
  [4,16,13,0,-5.4,-.1,0,-5.4,-3.3,0,-9.4,13.7,0,-9.4],
// 4 16 2.4 0 1.5 6.8 0 2.5 6.4 0 3.7 2.1 0 3.7
  [4,16,2.4,0,1.5,6.8,0,2.5,6.4,0,3.7,2.1,0,3.7],
// 4 16 3.4 0 7.6 2.4 0 5.8 6.8 0 4.9 5 0 8.9
  [4,16,3.4,0,7.6,2.4,0,5.8,6.8,0,4.9,5,0,8.9],
// 4 16 2.4 0 5.8 2.1 0 3.7 6.4 0 3.7 6.8 0 4.9
  [4,16,2.4,0,5.8,2.1,0,3.7,6.4,0,3.7,6.8,0,4.9],
// 4 16 5 0 8.9 6.8 0 4.9 7.8 0 5.4 7.1 0 9.4
  [4,16,5,0,8.9,6.8,0,4.9,7.8,0,5.4,7.1,0,9.4],
// 4 16 17.8 0 9.4 7.1 0 9.4 7.8 0 5.4 17.8 0 5.4
  [4,16,17.8,0,9.4,7.1,0,9.4,7.8,0,5.4,17.8,0,5.4],
// 4 16 15.8 0 -8.9 14 0 -4.9 13 0 -5.4 13.7 0 -9.4
  [4,16,15.8,0,-8.9,14,0,-4.9,13,0,-5.4,13.7,0,-9.4],
// 4 16 18.4 0 -5.8 14.4 0 -3.6 14 0 -4.9 17.5 0 -7.6
  [4,16,18.4,0,-5.8,14.4,0,-3.6,14,0,-4.9,17.5,0,-7.6],
// 4 16 14.4 0 -3.6 18.4 0 -5.8 18.7 0 -3.7 18.4 0 -1.5
  [4,16,14.4,0,-3.6,18.4,0,-5.8,18.7,0,-3.7,18.4,0,-1.5],
// 3 16 14 0 -4.9 15.8 0 -8.9 17.5 0 -7.6
  [3,16,14,0,-4.9,15.8,0,-8.9,17.5,0,-7.6],
// 4 16 13 0 -2 14.1 0 -2.5 15.8 0 1.6 13.7 0 2.1
  [4,16,13,0,-2,14.1,0,-2.5,15.8,0,1.6,13.7,0,2.1],
// 4 16 17.5 0 .3 15.8 0 1.6 14.1 0 -2.5 18.4 0 -1.5
  [4,16,17.5,0,.3,15.8,0,1.6,14.1,0,-2.5,18.4,0,-1.5],
// 3 16 18.4 0 -1.5 14.1 0 -2.5 14.4 0 -3.6
  [3,16,18.4,0,-1.5,14.1,0,-2.5,14.4,0,-3.6],
// 4 16 23.9 0 6.5 18.7 0 -9.4 23.2 0 -9.4 28 0 5
  [4,16,23.9,0,6.5,18.7,0,-9.4,23.2,0,-9.4,28,0,5],
// 4 16 28 0 5 25.1 0 8.5 24.5 0 7.8 23.9 0 6.5
  [4,16,28,0,5,25.1,0,8.5,24.5,0,7.8,23.9,0,6.5],
// 4 16 27.2 0 9.3 26.1 0 9 28.4 0 5.3 28.4 0 9.4
  [4,16,27.2,0,9.3,26.1,0,9,28.4,0,5.3,28.4,0,9.4],
// 4 16 26.1 0 9 25.1 0 8.5 28 0 5 28.4 0 5.3
  [4,16,26.1,0,9,25.1,0,8.5,28,0,5,28.4,0,5.3],
// 4 16 33.6 0 -9.4 38 0 -9.4 32.8 0 6.5 28.7 0 5
  [4,16,33.6,0,-9.4,38,0,-9.4,32.8,0,6.5,28.7,0,5],
// 4 16 30.7 0 9 29.6 0 9.3 28.4 0 5.3 28.7 0 5
  [4,16,30.7,0,9,29.6,0,9.3,28.4,0,5.3,28.7,0,5],
// 3 16 28.4 0 9.4 28.4 0 5.3 29.6 0 9.3
  [3,16,28.4,0,9.4,28.4,0,5.3,29.6,0,9.3],
// 4 16 28.7 0 5 32.299 0 7.8 31.6 0 8.5 30.7 0 9
  [4,16,28.7,0,5,32.299,0,7.8,31.6,0,8.5,30.7,0,9],
// 3 16 32.299 0 7.8 28.7 0 5 32.8 0 6.5
  [3,16,32.299,0,7.8,28.7,0,5,32.8,0,6.5],
];
module ldraw_lib__logo_nasa(step=0, col=false, unit=2/5, alt=false, line=0.2, solid=!$preview)
    makepoly(ldraw_lib__logo_nasa(), step=step, col=col, unit=unit, alt=alt, line=line, solid=solid);
ldraw_lib__logo_nasa(line=0.2);
// file: ../p/box5-12.scad
use <../lib.scad>
function ldraw_lib__box5_12() = [
// 0 Box with 5 Faces without Any Edges
// 0 Name: box5-12.dat
// 0 Author: Chris Dee [cwdee]
// 0 !LDRAW_ORG Primitive UPDATE 2009-02
// 0 !LICENSE Licensed under CC BY 2.0 and CC BY 4.0 : see CAreadme.txt
// 
// 0 BFC CERTIFY CCW
  [0,"BFC","CERTIFY"],
  [0,"BFC","CCW"],
// 
// 0 !HISTORY 2009-09-03 [PTadmin] Official Update 2009-02
// 
// 
// 4 16 1 1 1 1 1 -1 -1 1 -1 -1 1 1
  [4,16,1,1,1,1,1,-1,-1,1,-1,-1,1,1],
// 4 16 -1 0 1 1 0 1 1 1 1 -1 1 1
  [4,16,-1,0,1,1,0,1,1,1,1,-1,1,1],
// 4 16 -1 0 -1 -1 0 1 -1 1 1 -1 1 -1
  [4,16,-1,0,-1,-1,0,1,-1,1,1,-1,1,-1],
// 4 16 1 0 -1 -1 0 -1 -1 1 -1 1 1 -1
  [4,16,1,0,-1,-1,0,-1,-1,1,-1,1,1,-1],
// 4 16 1 0 1 1 0 -1 1 1 -1 1 1 1
  [4,16,1,0,1,1,0,-1,1,1,-1,1,1,1],
// 0
];
module ldraw_lib__box5_12(step=0, col=false, unit=2/5, alt=false, line=0.2, solid=!$preview)
    makepoly(ldraw_lib__box5_12(), step=step, col=col, unit=unit, alt=alt, line=line, solid=solid);
ldraw_lib__box5_12(line=0.2);
// file: 4865a.scad
use <../lib.scad>
use <s/4865as01.scad>
function ldraw_lib__4865a() = [
// 0 Panel  1 x  2 x  1 with Square Corners
// 0 Name: 4865a.dat
// 0 Author: James Jessiman
// 0 !LDRAW_ORG Part UPDATE 2020-03
// 0 !LICENSE Licensed under CC BY 2.0 and CC BY 4.0 : see CAreadme.txt
// 
// 0 BFC CERTIFY CCW
  [0,"BFC","CERTIFY"],
  [0,"BFC","CCW"],
// 
// 0 !HISTORY 2003-07-03 [Steffen] BFCed, subfiled
// 0 !HISTORY 2004-04-22 [PTadmin] Official Update 2004-02
// 0 !HISTORY 2007-07-09 [PTadmin] Header formatted for Contributor Agreement
// 0 !HISTORY 2008-07-01 [PTadmin] Official Update 2008-01
// 0 !HISTORY 2011-12-08 [PTadmin] Renamed from 4865
// 0 !HISTORY 2011-12-29 [PTadmin] Official Update 2011-02
// 0 !HISTORY 2020-08-01 [cwdee] Use renamed subfile
// 0 !HISTORY 2020-12-29 [PTadmin] Official Update 2020-03
// 
// 
// 1 16 0 0 0 1 0 0 0 1 0 0 0 1 s\4865as01.dat
  [1,16,0,0,0,1,0,0,0,1,0,0,0,1, ldraw_lib__s__4865as01()],
// 4 16 20 24 10 -20 24 10 -20 0 10 20 0 10
  [4,16,20,24,10,-20,24,10,-20,0,10,20,0,10],
// 
];
module ldraw_lib__4865a(step=0, col=false, unit=2/5, alt=false, line=0.2, solid=!$preview)
    makepoly(ldraw_lib__4865a(), step=step, col=col, unit=unit, alt=alt, line=line, solid=solid);
ldraw_lib__4865a(line=0.2);
// file: 163345f.scad
use <../lib.scad>
use <../p/box5-12.scad>
use <../p/logo-nasa-bg.scad>
use <../p/logo-nasa.scad>
function ldraw_lib__163345f() = [
// 0 Sticker  0.7 x  1.7 with Red NASA Worm Logo
// 0 Name: 163345f.dat
// 0 Author: Takeshi Takahashi [RainbowDolphin]
// 0 !LDRAW_ORG Part UPDATE 2022-06
// 0 !LICENSE Licensed under CC BY 2.0 and CC BY 4.0 : see CAreadme.txt
// 
// 0 BFC CERTIFY CCW
  [0,"BFC","CERTIFY"],
  [0,"BFC","CCW"],
// 
// 0 !KEYWORDS Bricklink 1682stk01, Brickowl 849575, Launch pad, Rebrickable 163345
// 0 !KEYWORDS Set 1682, Space Shuttle
// 
// 0 !HISTORY 2022-12-20 [PTadmin] Official Update 2022-06
// 
// 
// 1 16 0 -0.25 0 17 0 0 0 0.25 0 0 0 7 box5-12.dat
  [1,16,0,-0.25,0,17,0,0,0,0.25,0,0,0,7, ldraw_lib__box5_12()],
// 0 BFC NOCLIP
  [0,"BFC","NOCLIP"],
// 1 4 0 -0.25 0 0.4 0 0 0 1 0 0 0 0.4 logo-nasa.dat
  [1,4,0,-0.25,0,0.4,0,0,0,1,0,0,0,0.4, ldraw_lib__logo_nasa()],
// 0 BFC CLIP
  [0,"BFC","CLIP"],
// 1 16 0 -0.25 0 0.4 0 0 0 1 0 0 0 0.4 logo-nasa-bg.dat
  [1,16,0,-0.25,0,0.4,0,0,0,1,0,0,0,0.4, ldraw_lib__logo_nasa_bg()],
// 4 16 17 -0.25 7 -17 -0.25 7 -16 -0.25 4.8 16 -0.25 4.8
  [4,16,17,-0.25,7,-17,-0.25,7,-16,-0.25,4.8,16,-0.25,4.8],
// 4 16 17 -0.25 -7 17 -0.25 7 16 -0.25 4.8 16 -0.25 -4.8
  [4,16,17,-0.25,-7,17,-0.25,7,16,-0.25,4.8,16,-0.25,-4.8],
// 4 16 -17 -0.25 -7 17 -0.25 -7 16 -0.25 -4.8 -16 -0.25 -4.8
  [4,16,-17,-0.25,-7,17,-0.25,-7,16,-0.25,-4.8,-16,-0.25,-4.8],
// 4 16 -17 -0.25 7 -17 -0.25 -7 -16 -0.25 -4.8 -16 -0.25 4.8
  [4,16,-17,-0.25,7,-17,-0.25,-7,-16,-0.25,-4.8,-16,-0.25,4.8],
];
module ldraw_lib__163345f(step=0, col=false, unit=2/5, alt=false, line=0.2, solid=!$preview)
    makepoly(ldraw_lib__163345f(), step=step, col=col, unit=unit, alt=alt, line=line, solid=solid);
ldraw_lib__163345f(line=0.2);
// main file
use <../lib.scad>
use <163345f.scad>
use <4865a.scad>
function ldraw_lib__4865ad01() = [
// 0 Panel  1 x  2 x  1 with NASA Worm Logo Sticker
// 0 Name: 4865ad01.dat
// 0 Author: Takeshi Takahashi [RainbowDolphin]
// 0 !LDRAW_ORG Shortcut UPDATE 2024-07
// 0 !LICENSE Licensed under CC BY 4.0 : see CAreadme.txt
// 
// 0 BFC CERTIFY CCW
  [0,"BFC","CERTIFY"],
  [0,"BFC","CCW"],
// 
// 0 !CATEGORY Sticker Shortcut
// 0 !KEYWORDS Bricklink 4865pb009, Set 1682, Space Shuttle
// 
// 0 !HISTORY 2024-08-26 [OrionP] Official Update 2024-07
// 
// 1 16 0 0 0 1 0 0 0 1 0 0 0 1 4865a.dat
  [1,16,0,0,0,1,0,0,0,1,0,0,0,1, ldraw_lib__4865a()],
// 1 16 0 8 10 -1 0 0 0 0 -1 0 -1 0 163345f.dat
  [1,16,0,8,10,-1,0,0,0,0,-1,0,-1,0, ldraw_lib__163345f()],
];
module ldraw_lib__4865ad01(step=0, col=false, unit=2/5, alt=false, line=0.2, solid=!$preview)
    makepoly(ldraw_lib__4865ad01(), step=step, col=col, unit=unit, alt=alt, line=line, solid=solid);
ldraw_lib__4865ad01(line=0.2);
